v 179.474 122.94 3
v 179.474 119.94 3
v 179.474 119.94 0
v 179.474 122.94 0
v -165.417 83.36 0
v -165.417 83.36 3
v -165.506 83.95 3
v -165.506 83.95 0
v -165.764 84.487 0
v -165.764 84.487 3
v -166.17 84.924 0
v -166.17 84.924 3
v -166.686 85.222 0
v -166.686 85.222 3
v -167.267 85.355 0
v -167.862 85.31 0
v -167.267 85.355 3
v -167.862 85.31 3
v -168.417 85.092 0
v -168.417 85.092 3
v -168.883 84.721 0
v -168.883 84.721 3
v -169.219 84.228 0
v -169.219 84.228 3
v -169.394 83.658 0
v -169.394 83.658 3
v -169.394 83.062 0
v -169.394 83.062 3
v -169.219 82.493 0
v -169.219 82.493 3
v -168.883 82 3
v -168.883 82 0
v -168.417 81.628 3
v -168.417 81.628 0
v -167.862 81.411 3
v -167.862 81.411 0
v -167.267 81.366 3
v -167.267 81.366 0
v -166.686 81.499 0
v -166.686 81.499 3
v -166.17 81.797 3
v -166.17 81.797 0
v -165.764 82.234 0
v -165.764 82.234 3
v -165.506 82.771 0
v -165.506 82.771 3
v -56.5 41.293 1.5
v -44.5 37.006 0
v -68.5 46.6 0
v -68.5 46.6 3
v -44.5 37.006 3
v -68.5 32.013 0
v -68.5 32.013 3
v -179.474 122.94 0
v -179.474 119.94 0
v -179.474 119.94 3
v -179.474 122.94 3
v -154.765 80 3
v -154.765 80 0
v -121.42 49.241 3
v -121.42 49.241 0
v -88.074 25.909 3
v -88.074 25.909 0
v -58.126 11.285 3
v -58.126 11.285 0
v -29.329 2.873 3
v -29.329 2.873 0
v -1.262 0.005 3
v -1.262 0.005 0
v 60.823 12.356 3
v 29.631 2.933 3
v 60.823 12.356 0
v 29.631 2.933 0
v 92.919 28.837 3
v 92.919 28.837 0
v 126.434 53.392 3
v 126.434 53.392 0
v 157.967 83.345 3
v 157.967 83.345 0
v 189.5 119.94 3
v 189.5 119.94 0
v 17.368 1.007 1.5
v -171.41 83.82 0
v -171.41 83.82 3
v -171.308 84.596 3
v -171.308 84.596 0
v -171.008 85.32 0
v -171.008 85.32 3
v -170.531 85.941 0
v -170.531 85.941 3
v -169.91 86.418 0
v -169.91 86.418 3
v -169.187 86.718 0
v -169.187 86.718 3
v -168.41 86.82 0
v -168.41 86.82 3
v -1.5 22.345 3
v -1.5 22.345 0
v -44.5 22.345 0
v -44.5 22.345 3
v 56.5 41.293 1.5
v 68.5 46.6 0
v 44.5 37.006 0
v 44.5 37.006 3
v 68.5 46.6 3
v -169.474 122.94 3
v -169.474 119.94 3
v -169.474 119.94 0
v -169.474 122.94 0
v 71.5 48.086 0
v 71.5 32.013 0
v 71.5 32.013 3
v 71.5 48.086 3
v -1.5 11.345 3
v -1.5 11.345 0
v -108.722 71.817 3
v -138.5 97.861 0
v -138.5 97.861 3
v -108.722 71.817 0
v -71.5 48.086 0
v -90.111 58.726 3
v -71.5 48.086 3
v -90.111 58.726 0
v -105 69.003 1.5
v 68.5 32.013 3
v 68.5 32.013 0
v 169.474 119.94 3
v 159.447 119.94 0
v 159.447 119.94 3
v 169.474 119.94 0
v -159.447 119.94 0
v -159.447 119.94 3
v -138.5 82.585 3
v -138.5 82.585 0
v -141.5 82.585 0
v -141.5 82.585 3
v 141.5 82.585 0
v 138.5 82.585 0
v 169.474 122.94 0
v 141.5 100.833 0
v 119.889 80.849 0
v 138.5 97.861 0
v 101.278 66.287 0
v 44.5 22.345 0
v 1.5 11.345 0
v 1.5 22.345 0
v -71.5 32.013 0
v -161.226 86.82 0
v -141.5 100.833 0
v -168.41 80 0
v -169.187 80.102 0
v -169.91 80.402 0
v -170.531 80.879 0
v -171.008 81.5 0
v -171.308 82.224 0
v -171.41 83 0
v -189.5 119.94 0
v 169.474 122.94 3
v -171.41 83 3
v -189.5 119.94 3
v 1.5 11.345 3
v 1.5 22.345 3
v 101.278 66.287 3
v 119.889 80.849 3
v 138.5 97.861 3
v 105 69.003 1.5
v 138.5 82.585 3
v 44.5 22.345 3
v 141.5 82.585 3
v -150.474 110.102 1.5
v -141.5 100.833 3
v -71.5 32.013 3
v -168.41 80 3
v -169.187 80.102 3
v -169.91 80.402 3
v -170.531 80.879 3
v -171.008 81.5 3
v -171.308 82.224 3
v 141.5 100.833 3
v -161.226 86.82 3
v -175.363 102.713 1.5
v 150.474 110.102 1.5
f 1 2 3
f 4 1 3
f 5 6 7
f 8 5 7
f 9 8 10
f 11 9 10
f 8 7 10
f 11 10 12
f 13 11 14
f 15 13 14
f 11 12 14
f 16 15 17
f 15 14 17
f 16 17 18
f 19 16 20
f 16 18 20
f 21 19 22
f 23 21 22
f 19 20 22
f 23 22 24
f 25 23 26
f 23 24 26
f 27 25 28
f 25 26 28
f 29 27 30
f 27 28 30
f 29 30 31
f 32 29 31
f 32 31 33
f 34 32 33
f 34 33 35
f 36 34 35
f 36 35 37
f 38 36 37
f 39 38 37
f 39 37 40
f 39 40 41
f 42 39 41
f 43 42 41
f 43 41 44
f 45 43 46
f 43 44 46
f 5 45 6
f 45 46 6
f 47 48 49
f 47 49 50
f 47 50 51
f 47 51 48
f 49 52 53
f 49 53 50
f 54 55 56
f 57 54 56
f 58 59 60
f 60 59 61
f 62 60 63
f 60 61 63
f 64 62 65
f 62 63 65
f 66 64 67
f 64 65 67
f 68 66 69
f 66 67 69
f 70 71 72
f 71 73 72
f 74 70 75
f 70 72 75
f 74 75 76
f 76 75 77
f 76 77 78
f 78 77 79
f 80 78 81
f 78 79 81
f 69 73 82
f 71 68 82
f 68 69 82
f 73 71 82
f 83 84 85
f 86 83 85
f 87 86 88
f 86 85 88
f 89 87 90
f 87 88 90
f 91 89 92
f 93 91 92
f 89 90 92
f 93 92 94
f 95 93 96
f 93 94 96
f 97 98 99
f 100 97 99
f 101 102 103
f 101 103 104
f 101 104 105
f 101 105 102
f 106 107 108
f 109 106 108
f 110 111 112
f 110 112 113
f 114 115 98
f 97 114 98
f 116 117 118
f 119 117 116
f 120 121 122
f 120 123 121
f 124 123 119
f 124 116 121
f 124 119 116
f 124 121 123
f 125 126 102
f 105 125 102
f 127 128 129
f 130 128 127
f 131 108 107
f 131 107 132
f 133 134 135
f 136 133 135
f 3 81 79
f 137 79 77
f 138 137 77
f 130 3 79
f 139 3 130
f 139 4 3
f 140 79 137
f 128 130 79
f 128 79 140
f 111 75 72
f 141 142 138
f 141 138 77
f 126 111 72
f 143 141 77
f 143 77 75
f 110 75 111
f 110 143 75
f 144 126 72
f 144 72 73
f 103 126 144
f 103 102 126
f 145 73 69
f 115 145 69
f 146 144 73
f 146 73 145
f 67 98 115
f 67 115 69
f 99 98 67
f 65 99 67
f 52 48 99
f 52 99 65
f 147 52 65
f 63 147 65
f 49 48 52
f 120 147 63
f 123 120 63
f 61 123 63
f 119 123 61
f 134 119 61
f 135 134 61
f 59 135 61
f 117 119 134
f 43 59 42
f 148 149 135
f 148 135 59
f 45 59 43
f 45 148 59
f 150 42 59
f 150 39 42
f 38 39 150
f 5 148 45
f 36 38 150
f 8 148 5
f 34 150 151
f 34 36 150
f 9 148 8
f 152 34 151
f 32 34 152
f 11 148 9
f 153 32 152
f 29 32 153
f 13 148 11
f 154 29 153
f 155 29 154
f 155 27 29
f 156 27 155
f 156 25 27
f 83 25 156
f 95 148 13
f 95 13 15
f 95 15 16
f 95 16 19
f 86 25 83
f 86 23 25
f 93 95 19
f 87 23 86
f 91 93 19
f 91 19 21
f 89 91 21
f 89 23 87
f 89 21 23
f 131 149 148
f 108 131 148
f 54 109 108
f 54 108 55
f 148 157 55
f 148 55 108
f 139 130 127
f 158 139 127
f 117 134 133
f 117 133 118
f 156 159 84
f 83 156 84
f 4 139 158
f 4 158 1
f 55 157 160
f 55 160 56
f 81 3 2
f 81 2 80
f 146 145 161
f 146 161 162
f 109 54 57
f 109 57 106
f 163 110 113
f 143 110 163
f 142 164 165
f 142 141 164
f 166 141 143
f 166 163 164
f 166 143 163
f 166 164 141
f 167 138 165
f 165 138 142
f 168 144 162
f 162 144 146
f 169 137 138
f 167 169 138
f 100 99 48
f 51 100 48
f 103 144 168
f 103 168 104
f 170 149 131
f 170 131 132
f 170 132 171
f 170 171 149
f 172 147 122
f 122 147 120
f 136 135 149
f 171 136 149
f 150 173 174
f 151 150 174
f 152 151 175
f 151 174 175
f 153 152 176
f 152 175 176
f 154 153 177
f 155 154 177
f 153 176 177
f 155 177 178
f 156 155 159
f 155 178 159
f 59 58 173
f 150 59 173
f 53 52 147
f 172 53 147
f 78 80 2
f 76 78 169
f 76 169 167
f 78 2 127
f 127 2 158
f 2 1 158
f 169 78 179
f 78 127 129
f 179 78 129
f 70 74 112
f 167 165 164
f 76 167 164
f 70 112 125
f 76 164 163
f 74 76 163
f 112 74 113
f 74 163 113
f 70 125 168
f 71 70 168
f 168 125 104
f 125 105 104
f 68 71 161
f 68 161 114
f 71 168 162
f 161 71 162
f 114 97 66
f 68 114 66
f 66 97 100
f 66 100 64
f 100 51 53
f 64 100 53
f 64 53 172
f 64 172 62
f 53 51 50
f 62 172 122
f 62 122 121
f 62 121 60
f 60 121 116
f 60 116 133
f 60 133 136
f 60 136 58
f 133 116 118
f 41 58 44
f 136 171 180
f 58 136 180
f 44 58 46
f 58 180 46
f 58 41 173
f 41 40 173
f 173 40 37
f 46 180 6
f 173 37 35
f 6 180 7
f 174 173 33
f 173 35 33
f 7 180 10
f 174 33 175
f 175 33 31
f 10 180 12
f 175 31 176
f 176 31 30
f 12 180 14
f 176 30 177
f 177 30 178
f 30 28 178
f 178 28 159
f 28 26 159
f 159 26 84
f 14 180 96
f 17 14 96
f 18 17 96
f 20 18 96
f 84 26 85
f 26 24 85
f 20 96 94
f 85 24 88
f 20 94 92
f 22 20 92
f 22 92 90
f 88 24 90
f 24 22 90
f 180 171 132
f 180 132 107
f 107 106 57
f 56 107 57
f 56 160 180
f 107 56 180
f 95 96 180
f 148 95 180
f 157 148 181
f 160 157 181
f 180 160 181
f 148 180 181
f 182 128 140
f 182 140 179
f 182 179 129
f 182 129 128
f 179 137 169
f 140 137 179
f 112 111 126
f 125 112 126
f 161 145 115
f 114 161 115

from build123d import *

# Parameters (mm, degrees)
EXTRUDE_1_DEPTH     = 3
SKETCH_2_W          = 10
SKETCH_2_H          = 3
EXTRUDE_2_DEPTH     = 3
SKETCH_3_R          = 2
EXTRUDE_3_DEPTH     = 3
SKETCH_4_W          = 89
SKETCH_4_H          = 40
CUT_EXTRUDE_1_DEPTH = 226.906067747
SKETCH_6_W          = 3
SKETCH_6_H          = 11
CUT_EXTRUDE_2_DEPTH = 226.906067747
SKETCH_7_W          = 3
SKETCH_7_H          = 16.718966486
SKETCH_7_H_2        = 18.904188623
CUT_EXTRUDE_3_DEPTH = 226.906067747


with BuildPart() as part:
    # 草图1 → 凸台-拉伸1 (new body)
    with BuildSketch(Plane.XY):
        with BuildLine():
            Line((-189.5, 119.940235), (-159.447034666, 119.940235))
            add(Edge.make_bspline(
                [(-159.447034666, 119.940235), (0, -59.940235), (159.447034666, 119.940235)],
                knots=[0.131879921, 0.131879921, 0.131879921, 0.868120079, 0.868120079, 0.868120079], degree=2))
            Line((159.447034666, 119.940235), (189.5, 119.940235))
            add(Edge.make_bspline(
                [(-189.5, 119.940235), (0, -119.940235), (189.5, 119.940235)],
                knots=[0.063497189, 0.063497189, 0.063497189, 0.936502811, 0.936502811, 0.936502811], degree=2))
        make_face()
    extrude(amount=EXTRUDE_1_DEPTH)

    # 草图2 → 凸台-拉伸2 (add)
    with BuildSketch(Plane(origin=(0, 119.940235, 0), x_dir=(1, 0, 0), z_dir=(0, 1, 0))):
        with Locations((-174.473517333, -1.5)):
            Rectangle(SKETCH_2_W, SKETCH_2_H)
        with Locations((174.473517333, -1.5)):
            Rectangle(SKETCH_2_W, SKETCH_2_H)
    extrude(amount=EXTRUDE_2_DEPTH)

    # 草图3 → 凸台-拉伸3 (add)
    with BuildSketch(Plane.XY.offset(3)):
        with BuildLine():
            Line((-154.764646507, 80), (-168.410095925, 80))
            ThreePointArc((-168.410095925, 80), (-170.531416269, 80.878679656), (-171.410095925, 83))
            Line((-171.410095925, 83), (-171.410095925, 83.819793517))
            ThreePointArc((-171.410095925, 83.819793517), (-170.531416269, 85.941113861), (-168.410095925, 86.819793517))
            Line((-168.410095925, 86.819793517), (-154.764646507, 86.819793517))
            Line((-154.764646507, 86.819793517), (-154.764646507, 80))
        make_face()
        with Locations((-167.416787516, 83.360380552)):
            Circle(SKETCH_3_R, mode=Mode.SUBTRACT)
    extrude(amount=-EXTRUDE_3_DEPTH)

    # 草图4 → 切除-拉伸1 (cut, through all)
    with BuildSketch(Plane(origin=(0, 0, 0), x_dir=(-1, 0, 0), z_dir=(0, 0, -1))):
        with Locations((0, 42.345035)):
            Rectangle(SKETCH_4_W, SKETCH_4_H)
    extrude(amount=-CUT_EXTRUDE_1_DEPTH, mode=Mode.SUBTRACT)

    # 草图6 → 切除-拉伸2 (cut, through all)
    with BuildSketch(Plane(origin=(0, 0, 0), x_dir=(-1, 0, 0), z_dir=(0, 0, -1))):
        with Locations((0, 16.845035)):
            Rectangle(SKETCH_6_W, SKETCH_6_H)
    extrude(amount=-CUT_EXTRUDE_2_DEPTH, mode=Mode.SUBTRACT)

    # 草图7 → 切除-拉伸3 (cut, through all)
    with BuildSketch(Plane(origin=(0, 0, 0), x_dir=(-1, 0, 0), z_dir=(0, 0, -1))):
        with Locations((70, 40.372399452)):
            Rectangle(SKETCH_7_W, SKETCH_7_H)
        with Locations((140, 92.037219299)):
            Rectangle(SKETCH_7_W, SKETCH_7_H_2)
        with Locations((-140, 92.037219299)):
            Rectangle(SKETCH_7_W, SKETCH_7_H_2)
        with Locations((-70, 40.372399452)):
            Rectangle(SKETCH_7_W, SKETCH_7_H)
    extrude(amount=-CUT_EXTRUDE_3_DEPTH, mode=Mode.SUBTRACT)


solid = part.part
